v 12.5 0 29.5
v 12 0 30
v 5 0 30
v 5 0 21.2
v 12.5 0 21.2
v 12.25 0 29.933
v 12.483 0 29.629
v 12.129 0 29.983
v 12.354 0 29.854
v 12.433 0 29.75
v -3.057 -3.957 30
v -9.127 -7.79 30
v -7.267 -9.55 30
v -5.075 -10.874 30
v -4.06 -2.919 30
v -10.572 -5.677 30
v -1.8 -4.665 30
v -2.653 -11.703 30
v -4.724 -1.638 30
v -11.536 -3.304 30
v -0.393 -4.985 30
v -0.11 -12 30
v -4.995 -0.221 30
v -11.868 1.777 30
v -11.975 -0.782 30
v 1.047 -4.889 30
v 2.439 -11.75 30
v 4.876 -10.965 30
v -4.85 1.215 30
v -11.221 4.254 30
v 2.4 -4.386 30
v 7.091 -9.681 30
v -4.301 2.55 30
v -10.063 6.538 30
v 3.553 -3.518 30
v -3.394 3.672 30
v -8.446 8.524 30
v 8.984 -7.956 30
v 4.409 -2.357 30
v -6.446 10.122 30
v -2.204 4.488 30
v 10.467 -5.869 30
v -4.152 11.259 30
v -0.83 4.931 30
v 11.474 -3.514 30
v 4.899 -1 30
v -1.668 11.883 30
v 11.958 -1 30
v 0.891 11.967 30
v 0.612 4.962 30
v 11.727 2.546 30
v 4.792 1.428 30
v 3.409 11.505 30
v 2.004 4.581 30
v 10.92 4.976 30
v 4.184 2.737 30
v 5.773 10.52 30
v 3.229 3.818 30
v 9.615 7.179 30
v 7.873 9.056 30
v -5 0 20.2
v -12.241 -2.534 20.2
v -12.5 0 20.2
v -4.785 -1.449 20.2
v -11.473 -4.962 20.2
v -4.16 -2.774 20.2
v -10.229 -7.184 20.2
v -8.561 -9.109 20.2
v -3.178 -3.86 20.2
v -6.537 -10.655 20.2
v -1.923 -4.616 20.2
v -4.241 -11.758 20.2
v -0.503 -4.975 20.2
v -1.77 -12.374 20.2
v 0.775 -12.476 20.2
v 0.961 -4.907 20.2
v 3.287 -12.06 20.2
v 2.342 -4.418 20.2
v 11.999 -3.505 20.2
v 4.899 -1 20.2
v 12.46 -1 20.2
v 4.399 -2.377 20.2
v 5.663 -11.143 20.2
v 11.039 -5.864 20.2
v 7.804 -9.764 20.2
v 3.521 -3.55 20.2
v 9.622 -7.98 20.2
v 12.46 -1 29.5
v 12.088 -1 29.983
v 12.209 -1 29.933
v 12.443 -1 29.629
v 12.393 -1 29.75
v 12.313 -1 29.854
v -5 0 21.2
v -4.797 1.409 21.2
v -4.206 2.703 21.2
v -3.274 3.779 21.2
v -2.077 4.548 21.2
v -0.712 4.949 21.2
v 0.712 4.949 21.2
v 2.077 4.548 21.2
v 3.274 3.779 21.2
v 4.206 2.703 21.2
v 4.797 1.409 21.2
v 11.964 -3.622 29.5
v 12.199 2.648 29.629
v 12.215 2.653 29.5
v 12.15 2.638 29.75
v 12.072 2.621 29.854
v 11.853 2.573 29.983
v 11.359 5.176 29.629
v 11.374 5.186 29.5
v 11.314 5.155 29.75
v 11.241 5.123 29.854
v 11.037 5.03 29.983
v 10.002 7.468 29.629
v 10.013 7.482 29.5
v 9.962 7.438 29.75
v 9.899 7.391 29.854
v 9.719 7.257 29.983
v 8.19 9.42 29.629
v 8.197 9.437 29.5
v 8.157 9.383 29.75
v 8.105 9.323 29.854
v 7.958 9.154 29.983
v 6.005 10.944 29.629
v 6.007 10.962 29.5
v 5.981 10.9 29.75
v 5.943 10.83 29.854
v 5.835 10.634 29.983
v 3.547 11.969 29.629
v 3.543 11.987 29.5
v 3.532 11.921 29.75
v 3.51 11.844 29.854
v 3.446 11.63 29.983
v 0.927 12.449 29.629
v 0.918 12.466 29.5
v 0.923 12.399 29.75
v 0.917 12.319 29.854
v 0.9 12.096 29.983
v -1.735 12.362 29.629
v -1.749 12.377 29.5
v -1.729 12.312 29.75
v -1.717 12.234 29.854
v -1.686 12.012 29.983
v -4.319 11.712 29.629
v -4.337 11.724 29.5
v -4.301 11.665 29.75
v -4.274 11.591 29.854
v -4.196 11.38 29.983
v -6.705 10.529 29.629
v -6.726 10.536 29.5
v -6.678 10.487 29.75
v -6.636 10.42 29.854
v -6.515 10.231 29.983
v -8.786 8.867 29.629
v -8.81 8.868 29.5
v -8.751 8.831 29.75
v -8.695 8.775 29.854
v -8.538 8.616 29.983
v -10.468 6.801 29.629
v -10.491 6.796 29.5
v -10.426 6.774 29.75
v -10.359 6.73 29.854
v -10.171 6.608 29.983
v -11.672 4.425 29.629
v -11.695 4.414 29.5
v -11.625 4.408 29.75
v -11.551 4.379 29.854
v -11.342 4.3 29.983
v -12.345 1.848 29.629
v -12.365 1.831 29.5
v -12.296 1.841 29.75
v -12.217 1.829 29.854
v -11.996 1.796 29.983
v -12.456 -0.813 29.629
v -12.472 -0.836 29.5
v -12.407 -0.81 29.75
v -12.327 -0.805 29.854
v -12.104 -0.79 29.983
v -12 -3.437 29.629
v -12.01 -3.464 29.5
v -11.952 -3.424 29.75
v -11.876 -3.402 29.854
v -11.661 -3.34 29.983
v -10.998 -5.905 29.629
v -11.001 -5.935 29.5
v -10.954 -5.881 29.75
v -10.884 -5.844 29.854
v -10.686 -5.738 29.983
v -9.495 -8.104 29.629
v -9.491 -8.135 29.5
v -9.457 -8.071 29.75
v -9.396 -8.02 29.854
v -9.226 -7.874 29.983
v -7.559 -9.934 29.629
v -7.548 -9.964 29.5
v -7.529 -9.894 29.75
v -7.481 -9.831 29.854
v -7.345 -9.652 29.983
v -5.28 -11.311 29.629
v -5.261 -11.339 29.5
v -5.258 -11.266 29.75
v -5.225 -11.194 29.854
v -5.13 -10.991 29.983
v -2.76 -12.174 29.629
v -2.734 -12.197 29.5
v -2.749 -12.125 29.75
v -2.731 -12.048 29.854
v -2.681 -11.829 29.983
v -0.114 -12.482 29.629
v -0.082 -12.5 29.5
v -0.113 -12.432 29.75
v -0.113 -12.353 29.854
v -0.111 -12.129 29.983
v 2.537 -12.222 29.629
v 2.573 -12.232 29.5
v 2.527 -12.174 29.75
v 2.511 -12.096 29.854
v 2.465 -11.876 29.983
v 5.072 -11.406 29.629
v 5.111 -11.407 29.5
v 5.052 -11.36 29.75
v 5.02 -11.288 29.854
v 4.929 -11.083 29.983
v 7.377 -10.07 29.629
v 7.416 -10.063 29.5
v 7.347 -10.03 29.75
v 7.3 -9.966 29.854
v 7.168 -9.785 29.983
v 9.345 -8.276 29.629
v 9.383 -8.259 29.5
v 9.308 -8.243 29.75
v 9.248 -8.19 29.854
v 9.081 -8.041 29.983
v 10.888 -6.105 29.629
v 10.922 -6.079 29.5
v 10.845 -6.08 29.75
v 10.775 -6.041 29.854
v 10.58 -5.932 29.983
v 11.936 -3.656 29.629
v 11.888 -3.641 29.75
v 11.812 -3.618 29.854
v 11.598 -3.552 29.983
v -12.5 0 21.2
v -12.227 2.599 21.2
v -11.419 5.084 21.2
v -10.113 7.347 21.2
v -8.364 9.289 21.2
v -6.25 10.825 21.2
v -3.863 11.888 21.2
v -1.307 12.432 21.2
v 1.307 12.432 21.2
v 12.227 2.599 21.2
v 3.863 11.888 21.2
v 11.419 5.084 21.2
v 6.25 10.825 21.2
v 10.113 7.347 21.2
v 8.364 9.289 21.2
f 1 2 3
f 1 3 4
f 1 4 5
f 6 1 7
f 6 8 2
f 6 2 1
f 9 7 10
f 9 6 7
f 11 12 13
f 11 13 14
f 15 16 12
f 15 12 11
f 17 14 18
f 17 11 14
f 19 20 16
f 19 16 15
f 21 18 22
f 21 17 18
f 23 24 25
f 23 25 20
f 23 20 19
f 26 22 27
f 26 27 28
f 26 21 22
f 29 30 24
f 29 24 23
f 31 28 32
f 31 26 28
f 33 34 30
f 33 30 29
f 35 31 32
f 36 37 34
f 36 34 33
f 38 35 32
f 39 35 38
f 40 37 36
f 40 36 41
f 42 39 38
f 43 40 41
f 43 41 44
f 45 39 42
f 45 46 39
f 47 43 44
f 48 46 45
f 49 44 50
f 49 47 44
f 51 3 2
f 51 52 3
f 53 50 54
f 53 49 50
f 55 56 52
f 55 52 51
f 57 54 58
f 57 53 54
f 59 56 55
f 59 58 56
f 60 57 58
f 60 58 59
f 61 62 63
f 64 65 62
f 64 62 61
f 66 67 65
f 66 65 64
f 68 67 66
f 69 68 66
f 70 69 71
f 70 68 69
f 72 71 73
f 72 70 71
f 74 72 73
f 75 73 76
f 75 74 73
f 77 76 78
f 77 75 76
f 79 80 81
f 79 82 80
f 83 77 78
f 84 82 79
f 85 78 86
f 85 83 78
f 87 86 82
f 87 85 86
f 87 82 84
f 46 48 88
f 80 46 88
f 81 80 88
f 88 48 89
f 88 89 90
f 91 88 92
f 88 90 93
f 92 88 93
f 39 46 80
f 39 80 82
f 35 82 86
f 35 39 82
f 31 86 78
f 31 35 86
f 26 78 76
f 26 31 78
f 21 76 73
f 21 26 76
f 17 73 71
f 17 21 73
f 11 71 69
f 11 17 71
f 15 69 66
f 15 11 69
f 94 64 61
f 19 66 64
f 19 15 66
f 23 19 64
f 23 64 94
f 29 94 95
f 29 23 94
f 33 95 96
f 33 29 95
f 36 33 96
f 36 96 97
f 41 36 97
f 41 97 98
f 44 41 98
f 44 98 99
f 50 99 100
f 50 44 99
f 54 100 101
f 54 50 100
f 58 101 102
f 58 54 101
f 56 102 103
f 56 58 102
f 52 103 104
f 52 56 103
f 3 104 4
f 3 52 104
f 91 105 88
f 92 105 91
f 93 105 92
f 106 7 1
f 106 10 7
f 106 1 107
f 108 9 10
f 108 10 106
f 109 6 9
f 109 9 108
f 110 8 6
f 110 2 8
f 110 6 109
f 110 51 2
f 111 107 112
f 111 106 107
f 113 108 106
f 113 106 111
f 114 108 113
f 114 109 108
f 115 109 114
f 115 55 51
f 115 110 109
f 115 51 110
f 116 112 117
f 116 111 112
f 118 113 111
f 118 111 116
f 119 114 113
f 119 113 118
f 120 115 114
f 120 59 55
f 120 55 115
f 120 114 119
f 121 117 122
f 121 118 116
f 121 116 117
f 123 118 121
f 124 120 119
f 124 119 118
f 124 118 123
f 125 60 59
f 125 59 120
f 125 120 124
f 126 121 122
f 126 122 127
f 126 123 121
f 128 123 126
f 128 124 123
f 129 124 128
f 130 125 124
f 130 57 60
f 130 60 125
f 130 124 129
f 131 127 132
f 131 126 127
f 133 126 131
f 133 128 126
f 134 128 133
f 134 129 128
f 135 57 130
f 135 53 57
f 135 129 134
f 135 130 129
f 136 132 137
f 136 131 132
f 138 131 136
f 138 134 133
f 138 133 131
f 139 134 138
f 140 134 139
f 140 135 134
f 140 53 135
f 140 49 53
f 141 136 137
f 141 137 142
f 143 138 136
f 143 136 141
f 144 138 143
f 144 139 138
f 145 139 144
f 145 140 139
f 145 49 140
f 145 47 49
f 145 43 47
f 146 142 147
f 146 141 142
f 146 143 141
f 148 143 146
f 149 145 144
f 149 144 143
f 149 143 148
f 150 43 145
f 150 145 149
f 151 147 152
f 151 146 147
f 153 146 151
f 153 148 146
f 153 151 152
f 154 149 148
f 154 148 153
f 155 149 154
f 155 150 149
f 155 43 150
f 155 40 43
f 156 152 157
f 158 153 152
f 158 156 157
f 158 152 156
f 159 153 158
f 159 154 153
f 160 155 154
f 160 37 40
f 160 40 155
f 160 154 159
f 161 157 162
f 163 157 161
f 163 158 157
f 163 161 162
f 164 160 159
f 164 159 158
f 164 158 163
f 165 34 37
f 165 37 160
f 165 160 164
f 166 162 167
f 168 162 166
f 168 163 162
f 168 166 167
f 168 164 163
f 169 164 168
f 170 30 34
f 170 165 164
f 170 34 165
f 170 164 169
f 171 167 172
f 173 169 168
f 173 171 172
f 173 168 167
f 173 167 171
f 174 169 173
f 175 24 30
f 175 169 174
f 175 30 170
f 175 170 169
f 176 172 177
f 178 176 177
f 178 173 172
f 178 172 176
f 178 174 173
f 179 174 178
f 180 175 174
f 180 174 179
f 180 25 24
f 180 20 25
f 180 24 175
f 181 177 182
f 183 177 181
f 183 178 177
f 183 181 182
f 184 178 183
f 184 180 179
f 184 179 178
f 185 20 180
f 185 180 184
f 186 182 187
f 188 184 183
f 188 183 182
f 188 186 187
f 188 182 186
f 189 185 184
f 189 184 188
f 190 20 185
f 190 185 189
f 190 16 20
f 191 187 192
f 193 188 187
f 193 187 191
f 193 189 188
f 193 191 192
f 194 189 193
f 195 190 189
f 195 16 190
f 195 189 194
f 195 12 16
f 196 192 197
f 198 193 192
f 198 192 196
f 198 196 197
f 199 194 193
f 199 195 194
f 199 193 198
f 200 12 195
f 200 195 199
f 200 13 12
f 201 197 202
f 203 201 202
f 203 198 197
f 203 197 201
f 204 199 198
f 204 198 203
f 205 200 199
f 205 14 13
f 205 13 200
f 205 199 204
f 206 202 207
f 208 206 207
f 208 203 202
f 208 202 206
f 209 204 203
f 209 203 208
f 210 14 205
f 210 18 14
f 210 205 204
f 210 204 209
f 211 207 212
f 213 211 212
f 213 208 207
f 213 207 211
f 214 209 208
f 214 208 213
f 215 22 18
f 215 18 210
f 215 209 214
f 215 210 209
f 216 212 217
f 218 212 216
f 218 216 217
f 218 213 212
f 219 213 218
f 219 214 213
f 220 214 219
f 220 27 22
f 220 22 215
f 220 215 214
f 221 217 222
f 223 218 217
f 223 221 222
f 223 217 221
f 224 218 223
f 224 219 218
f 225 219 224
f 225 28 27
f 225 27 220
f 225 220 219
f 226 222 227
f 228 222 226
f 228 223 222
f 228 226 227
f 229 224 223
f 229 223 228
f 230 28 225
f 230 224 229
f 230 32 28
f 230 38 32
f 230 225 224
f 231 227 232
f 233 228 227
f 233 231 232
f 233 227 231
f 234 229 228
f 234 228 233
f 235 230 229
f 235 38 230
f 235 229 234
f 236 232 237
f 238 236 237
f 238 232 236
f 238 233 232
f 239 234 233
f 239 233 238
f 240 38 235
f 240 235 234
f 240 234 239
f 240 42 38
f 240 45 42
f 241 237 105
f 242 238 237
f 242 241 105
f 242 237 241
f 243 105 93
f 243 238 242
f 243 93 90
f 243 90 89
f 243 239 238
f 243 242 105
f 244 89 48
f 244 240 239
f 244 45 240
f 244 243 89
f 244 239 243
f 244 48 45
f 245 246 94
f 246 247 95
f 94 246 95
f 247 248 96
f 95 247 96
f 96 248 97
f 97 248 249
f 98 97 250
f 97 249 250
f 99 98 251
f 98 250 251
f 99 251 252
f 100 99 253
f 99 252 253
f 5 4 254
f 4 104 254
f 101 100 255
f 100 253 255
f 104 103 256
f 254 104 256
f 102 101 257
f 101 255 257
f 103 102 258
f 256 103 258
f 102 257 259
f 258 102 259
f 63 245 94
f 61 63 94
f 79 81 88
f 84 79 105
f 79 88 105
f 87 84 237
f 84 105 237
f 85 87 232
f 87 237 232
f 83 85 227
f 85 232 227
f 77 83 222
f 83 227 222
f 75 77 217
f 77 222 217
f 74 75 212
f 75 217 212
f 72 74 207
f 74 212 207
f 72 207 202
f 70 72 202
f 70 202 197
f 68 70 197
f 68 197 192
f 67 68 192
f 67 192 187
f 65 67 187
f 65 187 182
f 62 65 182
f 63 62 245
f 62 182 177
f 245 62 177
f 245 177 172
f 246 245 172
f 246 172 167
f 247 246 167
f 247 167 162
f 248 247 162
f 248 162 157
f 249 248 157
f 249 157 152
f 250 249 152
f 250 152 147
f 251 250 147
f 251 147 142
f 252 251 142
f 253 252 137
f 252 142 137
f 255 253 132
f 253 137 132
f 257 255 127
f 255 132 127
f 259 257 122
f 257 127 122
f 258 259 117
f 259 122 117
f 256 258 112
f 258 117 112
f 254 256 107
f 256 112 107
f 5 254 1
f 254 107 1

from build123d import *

# Parameters (mm, degrees)
SKETCH002_R     = 12.5
SKETCH002_R_2   = 5
PAD003_DEPTH    = 8.8
PAD004_DEPTH    = 1
FILLET001_R     = 0.5
SKETCH008_W     = 7.8
SKETCH008_H     = 1
POCKET001_DEPTH = 9.8


with BuildPart() as part:
    # Sketch002 → Pad003 (new body)
    with BuildSketch(Plane.XY.offset(21.2)):
        Circle(SKETCH002_R)
        Circle(SKETCH002_R_2, mode=Mode.SUBTRACT)
    extrude(amount=PAD003_DEPTH)

    # Sketch005 → Pad004 (new body)
    with BuildSketch(Plane(origin=(0, 0, 21.2), x_dir=(1, 0, 0), z_dir=(0, 0, -1))):
        with BuildLine():
            ThreePointArc((12.5, 0), (0, 12.5), (-12.5, 0))
            Line((-12.5, 0), (-5, 0))
            ThreePointArc((5, 0), (0, 5), (-5, 0))
            Line((5, 0), (12.5, 0))
        make_face()
    extrude(amount=PAD004_DEPTH)

    # Fillet001
    fillet001_edges = [part.edges().sort_by_distance(p)[0] for p in [
        (-12.5, 0, 30),
    ]]
    fillet(fillet001_edges, radius=FILLET001_R)

    # Sketch008 → Pocket001 (cut)
    with BuildSketch(Plane.XY.offset(30)):
        with Locations((8.7, -0.5)):
            Rectangle(SKETCH008_W, SKETCH008_H)
    extrude(amount=-POCKET001_DEPTH, mode=Mode.SUBTRACT)


solid = part.part
